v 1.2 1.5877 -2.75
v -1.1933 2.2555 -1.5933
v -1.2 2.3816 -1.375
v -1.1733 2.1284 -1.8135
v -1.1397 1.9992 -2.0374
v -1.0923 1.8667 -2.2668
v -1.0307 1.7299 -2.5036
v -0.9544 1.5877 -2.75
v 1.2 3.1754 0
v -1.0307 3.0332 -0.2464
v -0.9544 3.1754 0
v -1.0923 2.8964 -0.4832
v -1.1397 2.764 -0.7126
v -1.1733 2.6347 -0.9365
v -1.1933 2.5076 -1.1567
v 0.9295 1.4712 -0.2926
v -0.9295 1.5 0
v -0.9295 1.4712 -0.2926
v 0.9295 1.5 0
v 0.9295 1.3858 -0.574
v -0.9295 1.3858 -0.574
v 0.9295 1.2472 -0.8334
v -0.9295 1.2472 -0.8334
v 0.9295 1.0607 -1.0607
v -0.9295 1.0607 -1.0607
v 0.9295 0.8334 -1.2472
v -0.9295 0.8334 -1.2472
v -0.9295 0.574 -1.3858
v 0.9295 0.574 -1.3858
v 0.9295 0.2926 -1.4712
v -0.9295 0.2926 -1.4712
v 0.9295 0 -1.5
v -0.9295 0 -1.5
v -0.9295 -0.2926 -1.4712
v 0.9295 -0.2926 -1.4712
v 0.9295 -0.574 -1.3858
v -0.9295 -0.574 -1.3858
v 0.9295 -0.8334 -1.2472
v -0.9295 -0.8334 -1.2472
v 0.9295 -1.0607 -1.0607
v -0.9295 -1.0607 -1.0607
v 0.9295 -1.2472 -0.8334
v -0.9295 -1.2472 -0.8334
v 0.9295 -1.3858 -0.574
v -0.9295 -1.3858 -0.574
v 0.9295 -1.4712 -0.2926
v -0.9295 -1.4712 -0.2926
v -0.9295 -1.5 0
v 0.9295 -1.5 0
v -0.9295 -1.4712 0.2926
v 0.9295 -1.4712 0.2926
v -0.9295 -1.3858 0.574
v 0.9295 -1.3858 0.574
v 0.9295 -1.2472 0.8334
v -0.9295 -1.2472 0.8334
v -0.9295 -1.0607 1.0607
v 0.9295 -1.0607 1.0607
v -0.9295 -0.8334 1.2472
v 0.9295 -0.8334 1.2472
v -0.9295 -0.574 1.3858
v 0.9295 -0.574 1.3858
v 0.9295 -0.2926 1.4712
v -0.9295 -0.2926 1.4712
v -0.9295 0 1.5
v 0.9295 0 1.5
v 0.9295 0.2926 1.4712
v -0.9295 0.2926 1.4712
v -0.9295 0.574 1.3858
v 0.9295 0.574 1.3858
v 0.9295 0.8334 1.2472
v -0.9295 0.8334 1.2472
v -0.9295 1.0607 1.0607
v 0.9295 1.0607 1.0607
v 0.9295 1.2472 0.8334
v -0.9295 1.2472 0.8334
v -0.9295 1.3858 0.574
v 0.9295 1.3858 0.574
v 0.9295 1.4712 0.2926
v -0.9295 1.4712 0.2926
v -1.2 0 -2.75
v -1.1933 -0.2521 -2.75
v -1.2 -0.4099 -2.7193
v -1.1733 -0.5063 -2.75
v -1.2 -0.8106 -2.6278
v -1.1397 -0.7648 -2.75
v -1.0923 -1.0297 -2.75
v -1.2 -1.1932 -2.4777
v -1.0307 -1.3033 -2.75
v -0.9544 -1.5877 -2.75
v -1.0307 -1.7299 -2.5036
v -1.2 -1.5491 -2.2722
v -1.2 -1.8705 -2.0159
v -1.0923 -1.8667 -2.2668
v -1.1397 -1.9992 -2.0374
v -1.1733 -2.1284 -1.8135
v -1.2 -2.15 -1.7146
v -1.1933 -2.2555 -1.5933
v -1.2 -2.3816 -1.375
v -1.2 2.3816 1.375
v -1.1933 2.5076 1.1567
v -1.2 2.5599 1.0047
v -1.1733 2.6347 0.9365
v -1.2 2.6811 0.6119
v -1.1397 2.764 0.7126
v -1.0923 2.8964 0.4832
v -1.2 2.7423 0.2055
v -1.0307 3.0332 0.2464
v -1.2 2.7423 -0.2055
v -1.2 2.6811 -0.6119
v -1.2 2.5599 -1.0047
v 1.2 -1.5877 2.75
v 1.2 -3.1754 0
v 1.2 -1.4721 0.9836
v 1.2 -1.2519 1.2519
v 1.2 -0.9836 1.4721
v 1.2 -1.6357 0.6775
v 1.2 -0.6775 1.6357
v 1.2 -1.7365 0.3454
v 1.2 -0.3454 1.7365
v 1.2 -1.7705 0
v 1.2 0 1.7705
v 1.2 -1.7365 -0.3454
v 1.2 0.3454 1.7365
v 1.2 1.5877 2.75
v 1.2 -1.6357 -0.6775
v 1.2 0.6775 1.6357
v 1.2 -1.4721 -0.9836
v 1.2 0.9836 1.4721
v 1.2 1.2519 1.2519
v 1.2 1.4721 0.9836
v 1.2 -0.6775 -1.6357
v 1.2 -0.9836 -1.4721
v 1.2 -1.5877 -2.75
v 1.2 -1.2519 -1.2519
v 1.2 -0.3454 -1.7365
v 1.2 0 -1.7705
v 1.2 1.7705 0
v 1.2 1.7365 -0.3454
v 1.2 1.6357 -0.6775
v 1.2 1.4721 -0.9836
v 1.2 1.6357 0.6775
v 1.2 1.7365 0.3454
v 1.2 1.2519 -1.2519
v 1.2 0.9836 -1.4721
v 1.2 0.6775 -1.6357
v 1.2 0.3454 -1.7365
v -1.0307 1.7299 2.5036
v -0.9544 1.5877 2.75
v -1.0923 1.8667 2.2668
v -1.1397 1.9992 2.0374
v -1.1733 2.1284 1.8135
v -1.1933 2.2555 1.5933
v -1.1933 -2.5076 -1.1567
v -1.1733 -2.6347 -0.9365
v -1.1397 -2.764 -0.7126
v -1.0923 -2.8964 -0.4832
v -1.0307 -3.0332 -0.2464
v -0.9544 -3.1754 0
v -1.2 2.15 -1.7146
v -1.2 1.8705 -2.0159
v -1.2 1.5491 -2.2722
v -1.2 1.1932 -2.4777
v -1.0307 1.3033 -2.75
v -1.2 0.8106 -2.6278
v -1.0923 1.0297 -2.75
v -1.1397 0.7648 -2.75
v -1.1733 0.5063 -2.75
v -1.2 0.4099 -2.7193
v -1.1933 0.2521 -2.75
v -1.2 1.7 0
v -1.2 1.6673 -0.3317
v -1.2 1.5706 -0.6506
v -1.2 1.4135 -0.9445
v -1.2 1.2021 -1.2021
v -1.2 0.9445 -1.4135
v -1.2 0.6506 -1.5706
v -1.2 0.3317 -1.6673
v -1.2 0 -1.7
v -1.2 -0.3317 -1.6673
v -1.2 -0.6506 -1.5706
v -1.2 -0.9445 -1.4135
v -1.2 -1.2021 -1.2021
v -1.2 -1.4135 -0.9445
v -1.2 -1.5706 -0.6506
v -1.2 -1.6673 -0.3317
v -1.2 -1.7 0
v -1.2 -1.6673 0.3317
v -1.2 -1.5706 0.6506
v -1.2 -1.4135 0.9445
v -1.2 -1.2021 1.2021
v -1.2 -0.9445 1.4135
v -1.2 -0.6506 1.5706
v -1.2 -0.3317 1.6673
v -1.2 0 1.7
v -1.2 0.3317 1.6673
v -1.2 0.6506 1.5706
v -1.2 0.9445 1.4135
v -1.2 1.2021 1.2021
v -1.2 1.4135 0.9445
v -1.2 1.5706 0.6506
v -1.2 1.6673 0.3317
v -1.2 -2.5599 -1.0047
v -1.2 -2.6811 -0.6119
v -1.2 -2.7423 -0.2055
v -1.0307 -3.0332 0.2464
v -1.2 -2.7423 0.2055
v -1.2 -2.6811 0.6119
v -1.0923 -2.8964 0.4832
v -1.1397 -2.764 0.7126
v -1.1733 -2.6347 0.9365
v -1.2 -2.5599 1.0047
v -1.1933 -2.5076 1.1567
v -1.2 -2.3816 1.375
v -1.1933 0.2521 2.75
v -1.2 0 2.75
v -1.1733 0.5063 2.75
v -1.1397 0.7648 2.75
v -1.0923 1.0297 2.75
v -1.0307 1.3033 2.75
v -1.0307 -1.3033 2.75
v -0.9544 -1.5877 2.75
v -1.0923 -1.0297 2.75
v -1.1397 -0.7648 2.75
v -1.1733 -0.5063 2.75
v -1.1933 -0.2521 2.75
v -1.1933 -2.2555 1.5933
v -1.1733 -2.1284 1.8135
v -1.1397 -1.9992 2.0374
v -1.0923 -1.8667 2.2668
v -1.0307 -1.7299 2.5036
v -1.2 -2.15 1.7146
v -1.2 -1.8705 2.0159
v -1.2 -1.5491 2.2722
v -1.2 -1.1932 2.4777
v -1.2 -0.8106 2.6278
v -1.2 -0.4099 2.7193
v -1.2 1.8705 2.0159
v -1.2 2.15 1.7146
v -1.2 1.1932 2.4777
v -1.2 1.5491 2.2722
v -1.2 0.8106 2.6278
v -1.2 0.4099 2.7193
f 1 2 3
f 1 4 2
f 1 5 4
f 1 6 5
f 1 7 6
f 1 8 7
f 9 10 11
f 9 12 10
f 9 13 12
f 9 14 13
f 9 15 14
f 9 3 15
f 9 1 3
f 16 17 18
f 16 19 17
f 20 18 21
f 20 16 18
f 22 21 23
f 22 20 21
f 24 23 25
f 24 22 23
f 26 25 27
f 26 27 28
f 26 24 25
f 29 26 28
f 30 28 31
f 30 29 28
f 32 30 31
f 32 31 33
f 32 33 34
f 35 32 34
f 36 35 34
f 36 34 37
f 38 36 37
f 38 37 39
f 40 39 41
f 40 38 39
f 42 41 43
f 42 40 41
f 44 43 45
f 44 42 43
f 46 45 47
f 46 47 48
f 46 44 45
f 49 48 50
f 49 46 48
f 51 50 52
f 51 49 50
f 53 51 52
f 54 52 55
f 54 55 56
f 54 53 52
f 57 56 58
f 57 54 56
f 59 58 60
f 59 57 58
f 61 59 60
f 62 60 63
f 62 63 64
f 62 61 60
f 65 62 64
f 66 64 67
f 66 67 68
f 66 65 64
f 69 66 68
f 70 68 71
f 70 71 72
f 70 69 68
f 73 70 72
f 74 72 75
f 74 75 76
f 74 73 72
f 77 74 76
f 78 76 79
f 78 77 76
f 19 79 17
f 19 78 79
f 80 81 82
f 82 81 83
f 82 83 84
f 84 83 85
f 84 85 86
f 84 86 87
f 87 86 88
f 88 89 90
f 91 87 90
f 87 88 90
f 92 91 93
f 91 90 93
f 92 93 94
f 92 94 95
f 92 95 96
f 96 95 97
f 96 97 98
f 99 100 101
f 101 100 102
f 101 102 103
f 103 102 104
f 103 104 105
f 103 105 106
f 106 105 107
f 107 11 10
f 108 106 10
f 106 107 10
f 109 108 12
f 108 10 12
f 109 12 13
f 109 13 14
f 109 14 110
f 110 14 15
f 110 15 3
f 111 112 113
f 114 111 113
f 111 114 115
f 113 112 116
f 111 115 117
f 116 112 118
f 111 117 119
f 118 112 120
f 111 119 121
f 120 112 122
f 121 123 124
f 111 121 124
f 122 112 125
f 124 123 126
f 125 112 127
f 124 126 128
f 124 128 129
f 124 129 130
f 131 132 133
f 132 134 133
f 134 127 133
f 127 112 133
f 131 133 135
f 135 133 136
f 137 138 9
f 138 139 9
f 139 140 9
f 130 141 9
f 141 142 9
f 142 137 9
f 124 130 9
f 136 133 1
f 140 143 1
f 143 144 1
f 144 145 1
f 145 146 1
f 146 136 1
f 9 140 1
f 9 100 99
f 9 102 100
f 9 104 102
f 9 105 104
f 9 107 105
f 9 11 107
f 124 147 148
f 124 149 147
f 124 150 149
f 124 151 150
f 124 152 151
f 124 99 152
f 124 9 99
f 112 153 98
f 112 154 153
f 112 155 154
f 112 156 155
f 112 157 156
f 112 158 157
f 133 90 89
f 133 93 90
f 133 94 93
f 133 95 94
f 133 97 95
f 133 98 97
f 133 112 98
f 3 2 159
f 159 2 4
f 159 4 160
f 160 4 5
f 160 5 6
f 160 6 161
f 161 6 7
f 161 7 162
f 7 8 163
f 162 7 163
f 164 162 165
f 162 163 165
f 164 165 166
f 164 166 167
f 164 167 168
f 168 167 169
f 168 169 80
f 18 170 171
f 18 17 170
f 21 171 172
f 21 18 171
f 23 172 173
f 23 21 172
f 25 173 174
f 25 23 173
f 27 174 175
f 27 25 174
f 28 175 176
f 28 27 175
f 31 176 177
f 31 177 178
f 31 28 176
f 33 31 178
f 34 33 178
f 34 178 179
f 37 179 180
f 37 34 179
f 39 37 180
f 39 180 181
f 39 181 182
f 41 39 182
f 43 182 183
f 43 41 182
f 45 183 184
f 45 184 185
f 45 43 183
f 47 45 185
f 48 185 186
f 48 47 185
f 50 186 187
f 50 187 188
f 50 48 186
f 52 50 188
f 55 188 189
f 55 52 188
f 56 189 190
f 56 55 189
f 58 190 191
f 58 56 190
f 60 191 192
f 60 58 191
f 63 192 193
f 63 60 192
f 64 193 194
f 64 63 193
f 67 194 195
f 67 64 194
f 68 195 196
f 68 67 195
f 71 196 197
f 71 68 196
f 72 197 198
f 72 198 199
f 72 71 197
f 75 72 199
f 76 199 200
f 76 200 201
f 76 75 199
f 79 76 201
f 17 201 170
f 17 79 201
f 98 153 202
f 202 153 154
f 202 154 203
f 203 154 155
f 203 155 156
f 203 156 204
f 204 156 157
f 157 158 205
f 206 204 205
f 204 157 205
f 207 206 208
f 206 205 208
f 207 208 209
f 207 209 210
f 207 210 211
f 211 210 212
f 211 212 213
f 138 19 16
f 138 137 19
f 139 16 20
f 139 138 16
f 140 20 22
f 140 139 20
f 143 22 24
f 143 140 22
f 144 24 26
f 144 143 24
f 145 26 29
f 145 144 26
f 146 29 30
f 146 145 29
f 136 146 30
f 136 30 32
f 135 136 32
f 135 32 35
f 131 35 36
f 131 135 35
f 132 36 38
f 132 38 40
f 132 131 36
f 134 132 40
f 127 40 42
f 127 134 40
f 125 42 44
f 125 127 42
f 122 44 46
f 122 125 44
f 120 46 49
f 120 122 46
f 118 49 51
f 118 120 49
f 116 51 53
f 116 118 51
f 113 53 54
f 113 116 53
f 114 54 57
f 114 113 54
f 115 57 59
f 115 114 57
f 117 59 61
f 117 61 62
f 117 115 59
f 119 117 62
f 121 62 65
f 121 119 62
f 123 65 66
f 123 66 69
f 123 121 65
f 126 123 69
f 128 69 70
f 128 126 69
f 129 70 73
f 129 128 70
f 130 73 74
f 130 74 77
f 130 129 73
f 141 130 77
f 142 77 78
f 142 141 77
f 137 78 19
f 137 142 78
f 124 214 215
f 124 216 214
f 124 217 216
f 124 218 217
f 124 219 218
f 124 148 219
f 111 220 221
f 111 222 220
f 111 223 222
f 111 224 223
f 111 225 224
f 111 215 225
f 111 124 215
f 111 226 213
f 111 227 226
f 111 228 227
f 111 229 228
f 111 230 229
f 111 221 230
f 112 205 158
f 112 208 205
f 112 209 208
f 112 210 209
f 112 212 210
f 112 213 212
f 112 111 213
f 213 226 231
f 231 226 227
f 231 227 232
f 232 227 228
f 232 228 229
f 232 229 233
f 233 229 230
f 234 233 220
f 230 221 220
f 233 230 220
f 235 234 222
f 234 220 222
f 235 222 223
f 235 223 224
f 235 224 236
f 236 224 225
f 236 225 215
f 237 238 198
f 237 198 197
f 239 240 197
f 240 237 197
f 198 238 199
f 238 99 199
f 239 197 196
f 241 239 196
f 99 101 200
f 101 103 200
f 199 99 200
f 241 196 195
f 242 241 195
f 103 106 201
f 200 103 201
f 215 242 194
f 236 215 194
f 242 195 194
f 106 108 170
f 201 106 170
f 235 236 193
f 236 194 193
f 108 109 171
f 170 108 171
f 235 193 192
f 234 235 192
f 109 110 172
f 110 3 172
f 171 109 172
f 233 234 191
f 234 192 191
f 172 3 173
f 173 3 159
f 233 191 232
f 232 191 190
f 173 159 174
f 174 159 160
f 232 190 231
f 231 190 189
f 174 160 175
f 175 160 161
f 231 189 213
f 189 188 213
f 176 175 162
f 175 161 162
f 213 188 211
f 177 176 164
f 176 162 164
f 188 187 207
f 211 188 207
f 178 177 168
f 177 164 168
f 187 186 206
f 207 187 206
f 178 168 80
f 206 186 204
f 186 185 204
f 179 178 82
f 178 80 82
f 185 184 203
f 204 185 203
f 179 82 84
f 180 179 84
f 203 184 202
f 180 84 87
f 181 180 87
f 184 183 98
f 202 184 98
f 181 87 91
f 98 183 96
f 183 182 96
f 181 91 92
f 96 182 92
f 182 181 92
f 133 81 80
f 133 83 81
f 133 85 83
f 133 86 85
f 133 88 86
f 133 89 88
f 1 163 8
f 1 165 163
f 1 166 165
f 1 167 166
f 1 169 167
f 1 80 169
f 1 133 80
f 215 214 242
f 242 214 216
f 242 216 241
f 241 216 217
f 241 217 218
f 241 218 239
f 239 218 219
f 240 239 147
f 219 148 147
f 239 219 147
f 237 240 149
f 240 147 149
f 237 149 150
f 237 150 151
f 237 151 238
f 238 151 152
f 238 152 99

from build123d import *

# Parameters (mm, degrees)
CUT_EXTRUDE1_DEPTH      = 1.2
CUT_EXTRUDE1_DEPTH_BACK = 1.2
SKETCH3_W               = 11
SKETCH3_H               = 11


with BuildPart() as part:
    # Sketch1 → Revolve1 (revolve)
    with BuildSketch(Plane.XY):
        Polygon((-1.2, 0), (-1.2, 2.75), (-0.940192379, 3.2), (1.2, 3.2), (1.2, 0), align=None)
    revolve(axis=Axis((1.2, 0, 0), (-1, 0, 0)))

    # Sketch2 → Cut-Revolve1 (revolve, cut)
    with BuildSketch(Plane.XY):
        Polygon((-1.2, 0), (-1.2, 1.7), (-0.9295, 1.5), (0.9295, 1.5), (1.2, 1.7705), (1.2, 0), align=None)
    revolve(axis=Axis((1.2, 0, 0), (-1, 0, 0)), mode=Mode.SUBTRACT)

    # Sketch3 → Cut-Extrude1 (cut, two sides: drawn at the far end of the back side and taken through both)
    with BuildSketch(Plane(origin=(0, 0, 0), x_dir=(0, 0, -1), z_dir=(1, 0, 0)).offset(-CUT_EXTRUDE1_DEPTH_BACK)):
        Rectangle(SKETCH3_W, SKETCH3_H)
        Polygon((-2.75, -1.58771324), (0, -3.175426481), (2.75, -1.58771324), (2.75, 1.58771324), (0, 3.175426481), (-2.75, 1.58771324), align=None, mode=Mode.SUBTRACT)
    extrude(amount=CUT_EXTRUDE1_DEPTH + CUT_EXTRUDE1_DEPTH_BACK, mode=Mode.SUBTRACT)


solid = part.part
